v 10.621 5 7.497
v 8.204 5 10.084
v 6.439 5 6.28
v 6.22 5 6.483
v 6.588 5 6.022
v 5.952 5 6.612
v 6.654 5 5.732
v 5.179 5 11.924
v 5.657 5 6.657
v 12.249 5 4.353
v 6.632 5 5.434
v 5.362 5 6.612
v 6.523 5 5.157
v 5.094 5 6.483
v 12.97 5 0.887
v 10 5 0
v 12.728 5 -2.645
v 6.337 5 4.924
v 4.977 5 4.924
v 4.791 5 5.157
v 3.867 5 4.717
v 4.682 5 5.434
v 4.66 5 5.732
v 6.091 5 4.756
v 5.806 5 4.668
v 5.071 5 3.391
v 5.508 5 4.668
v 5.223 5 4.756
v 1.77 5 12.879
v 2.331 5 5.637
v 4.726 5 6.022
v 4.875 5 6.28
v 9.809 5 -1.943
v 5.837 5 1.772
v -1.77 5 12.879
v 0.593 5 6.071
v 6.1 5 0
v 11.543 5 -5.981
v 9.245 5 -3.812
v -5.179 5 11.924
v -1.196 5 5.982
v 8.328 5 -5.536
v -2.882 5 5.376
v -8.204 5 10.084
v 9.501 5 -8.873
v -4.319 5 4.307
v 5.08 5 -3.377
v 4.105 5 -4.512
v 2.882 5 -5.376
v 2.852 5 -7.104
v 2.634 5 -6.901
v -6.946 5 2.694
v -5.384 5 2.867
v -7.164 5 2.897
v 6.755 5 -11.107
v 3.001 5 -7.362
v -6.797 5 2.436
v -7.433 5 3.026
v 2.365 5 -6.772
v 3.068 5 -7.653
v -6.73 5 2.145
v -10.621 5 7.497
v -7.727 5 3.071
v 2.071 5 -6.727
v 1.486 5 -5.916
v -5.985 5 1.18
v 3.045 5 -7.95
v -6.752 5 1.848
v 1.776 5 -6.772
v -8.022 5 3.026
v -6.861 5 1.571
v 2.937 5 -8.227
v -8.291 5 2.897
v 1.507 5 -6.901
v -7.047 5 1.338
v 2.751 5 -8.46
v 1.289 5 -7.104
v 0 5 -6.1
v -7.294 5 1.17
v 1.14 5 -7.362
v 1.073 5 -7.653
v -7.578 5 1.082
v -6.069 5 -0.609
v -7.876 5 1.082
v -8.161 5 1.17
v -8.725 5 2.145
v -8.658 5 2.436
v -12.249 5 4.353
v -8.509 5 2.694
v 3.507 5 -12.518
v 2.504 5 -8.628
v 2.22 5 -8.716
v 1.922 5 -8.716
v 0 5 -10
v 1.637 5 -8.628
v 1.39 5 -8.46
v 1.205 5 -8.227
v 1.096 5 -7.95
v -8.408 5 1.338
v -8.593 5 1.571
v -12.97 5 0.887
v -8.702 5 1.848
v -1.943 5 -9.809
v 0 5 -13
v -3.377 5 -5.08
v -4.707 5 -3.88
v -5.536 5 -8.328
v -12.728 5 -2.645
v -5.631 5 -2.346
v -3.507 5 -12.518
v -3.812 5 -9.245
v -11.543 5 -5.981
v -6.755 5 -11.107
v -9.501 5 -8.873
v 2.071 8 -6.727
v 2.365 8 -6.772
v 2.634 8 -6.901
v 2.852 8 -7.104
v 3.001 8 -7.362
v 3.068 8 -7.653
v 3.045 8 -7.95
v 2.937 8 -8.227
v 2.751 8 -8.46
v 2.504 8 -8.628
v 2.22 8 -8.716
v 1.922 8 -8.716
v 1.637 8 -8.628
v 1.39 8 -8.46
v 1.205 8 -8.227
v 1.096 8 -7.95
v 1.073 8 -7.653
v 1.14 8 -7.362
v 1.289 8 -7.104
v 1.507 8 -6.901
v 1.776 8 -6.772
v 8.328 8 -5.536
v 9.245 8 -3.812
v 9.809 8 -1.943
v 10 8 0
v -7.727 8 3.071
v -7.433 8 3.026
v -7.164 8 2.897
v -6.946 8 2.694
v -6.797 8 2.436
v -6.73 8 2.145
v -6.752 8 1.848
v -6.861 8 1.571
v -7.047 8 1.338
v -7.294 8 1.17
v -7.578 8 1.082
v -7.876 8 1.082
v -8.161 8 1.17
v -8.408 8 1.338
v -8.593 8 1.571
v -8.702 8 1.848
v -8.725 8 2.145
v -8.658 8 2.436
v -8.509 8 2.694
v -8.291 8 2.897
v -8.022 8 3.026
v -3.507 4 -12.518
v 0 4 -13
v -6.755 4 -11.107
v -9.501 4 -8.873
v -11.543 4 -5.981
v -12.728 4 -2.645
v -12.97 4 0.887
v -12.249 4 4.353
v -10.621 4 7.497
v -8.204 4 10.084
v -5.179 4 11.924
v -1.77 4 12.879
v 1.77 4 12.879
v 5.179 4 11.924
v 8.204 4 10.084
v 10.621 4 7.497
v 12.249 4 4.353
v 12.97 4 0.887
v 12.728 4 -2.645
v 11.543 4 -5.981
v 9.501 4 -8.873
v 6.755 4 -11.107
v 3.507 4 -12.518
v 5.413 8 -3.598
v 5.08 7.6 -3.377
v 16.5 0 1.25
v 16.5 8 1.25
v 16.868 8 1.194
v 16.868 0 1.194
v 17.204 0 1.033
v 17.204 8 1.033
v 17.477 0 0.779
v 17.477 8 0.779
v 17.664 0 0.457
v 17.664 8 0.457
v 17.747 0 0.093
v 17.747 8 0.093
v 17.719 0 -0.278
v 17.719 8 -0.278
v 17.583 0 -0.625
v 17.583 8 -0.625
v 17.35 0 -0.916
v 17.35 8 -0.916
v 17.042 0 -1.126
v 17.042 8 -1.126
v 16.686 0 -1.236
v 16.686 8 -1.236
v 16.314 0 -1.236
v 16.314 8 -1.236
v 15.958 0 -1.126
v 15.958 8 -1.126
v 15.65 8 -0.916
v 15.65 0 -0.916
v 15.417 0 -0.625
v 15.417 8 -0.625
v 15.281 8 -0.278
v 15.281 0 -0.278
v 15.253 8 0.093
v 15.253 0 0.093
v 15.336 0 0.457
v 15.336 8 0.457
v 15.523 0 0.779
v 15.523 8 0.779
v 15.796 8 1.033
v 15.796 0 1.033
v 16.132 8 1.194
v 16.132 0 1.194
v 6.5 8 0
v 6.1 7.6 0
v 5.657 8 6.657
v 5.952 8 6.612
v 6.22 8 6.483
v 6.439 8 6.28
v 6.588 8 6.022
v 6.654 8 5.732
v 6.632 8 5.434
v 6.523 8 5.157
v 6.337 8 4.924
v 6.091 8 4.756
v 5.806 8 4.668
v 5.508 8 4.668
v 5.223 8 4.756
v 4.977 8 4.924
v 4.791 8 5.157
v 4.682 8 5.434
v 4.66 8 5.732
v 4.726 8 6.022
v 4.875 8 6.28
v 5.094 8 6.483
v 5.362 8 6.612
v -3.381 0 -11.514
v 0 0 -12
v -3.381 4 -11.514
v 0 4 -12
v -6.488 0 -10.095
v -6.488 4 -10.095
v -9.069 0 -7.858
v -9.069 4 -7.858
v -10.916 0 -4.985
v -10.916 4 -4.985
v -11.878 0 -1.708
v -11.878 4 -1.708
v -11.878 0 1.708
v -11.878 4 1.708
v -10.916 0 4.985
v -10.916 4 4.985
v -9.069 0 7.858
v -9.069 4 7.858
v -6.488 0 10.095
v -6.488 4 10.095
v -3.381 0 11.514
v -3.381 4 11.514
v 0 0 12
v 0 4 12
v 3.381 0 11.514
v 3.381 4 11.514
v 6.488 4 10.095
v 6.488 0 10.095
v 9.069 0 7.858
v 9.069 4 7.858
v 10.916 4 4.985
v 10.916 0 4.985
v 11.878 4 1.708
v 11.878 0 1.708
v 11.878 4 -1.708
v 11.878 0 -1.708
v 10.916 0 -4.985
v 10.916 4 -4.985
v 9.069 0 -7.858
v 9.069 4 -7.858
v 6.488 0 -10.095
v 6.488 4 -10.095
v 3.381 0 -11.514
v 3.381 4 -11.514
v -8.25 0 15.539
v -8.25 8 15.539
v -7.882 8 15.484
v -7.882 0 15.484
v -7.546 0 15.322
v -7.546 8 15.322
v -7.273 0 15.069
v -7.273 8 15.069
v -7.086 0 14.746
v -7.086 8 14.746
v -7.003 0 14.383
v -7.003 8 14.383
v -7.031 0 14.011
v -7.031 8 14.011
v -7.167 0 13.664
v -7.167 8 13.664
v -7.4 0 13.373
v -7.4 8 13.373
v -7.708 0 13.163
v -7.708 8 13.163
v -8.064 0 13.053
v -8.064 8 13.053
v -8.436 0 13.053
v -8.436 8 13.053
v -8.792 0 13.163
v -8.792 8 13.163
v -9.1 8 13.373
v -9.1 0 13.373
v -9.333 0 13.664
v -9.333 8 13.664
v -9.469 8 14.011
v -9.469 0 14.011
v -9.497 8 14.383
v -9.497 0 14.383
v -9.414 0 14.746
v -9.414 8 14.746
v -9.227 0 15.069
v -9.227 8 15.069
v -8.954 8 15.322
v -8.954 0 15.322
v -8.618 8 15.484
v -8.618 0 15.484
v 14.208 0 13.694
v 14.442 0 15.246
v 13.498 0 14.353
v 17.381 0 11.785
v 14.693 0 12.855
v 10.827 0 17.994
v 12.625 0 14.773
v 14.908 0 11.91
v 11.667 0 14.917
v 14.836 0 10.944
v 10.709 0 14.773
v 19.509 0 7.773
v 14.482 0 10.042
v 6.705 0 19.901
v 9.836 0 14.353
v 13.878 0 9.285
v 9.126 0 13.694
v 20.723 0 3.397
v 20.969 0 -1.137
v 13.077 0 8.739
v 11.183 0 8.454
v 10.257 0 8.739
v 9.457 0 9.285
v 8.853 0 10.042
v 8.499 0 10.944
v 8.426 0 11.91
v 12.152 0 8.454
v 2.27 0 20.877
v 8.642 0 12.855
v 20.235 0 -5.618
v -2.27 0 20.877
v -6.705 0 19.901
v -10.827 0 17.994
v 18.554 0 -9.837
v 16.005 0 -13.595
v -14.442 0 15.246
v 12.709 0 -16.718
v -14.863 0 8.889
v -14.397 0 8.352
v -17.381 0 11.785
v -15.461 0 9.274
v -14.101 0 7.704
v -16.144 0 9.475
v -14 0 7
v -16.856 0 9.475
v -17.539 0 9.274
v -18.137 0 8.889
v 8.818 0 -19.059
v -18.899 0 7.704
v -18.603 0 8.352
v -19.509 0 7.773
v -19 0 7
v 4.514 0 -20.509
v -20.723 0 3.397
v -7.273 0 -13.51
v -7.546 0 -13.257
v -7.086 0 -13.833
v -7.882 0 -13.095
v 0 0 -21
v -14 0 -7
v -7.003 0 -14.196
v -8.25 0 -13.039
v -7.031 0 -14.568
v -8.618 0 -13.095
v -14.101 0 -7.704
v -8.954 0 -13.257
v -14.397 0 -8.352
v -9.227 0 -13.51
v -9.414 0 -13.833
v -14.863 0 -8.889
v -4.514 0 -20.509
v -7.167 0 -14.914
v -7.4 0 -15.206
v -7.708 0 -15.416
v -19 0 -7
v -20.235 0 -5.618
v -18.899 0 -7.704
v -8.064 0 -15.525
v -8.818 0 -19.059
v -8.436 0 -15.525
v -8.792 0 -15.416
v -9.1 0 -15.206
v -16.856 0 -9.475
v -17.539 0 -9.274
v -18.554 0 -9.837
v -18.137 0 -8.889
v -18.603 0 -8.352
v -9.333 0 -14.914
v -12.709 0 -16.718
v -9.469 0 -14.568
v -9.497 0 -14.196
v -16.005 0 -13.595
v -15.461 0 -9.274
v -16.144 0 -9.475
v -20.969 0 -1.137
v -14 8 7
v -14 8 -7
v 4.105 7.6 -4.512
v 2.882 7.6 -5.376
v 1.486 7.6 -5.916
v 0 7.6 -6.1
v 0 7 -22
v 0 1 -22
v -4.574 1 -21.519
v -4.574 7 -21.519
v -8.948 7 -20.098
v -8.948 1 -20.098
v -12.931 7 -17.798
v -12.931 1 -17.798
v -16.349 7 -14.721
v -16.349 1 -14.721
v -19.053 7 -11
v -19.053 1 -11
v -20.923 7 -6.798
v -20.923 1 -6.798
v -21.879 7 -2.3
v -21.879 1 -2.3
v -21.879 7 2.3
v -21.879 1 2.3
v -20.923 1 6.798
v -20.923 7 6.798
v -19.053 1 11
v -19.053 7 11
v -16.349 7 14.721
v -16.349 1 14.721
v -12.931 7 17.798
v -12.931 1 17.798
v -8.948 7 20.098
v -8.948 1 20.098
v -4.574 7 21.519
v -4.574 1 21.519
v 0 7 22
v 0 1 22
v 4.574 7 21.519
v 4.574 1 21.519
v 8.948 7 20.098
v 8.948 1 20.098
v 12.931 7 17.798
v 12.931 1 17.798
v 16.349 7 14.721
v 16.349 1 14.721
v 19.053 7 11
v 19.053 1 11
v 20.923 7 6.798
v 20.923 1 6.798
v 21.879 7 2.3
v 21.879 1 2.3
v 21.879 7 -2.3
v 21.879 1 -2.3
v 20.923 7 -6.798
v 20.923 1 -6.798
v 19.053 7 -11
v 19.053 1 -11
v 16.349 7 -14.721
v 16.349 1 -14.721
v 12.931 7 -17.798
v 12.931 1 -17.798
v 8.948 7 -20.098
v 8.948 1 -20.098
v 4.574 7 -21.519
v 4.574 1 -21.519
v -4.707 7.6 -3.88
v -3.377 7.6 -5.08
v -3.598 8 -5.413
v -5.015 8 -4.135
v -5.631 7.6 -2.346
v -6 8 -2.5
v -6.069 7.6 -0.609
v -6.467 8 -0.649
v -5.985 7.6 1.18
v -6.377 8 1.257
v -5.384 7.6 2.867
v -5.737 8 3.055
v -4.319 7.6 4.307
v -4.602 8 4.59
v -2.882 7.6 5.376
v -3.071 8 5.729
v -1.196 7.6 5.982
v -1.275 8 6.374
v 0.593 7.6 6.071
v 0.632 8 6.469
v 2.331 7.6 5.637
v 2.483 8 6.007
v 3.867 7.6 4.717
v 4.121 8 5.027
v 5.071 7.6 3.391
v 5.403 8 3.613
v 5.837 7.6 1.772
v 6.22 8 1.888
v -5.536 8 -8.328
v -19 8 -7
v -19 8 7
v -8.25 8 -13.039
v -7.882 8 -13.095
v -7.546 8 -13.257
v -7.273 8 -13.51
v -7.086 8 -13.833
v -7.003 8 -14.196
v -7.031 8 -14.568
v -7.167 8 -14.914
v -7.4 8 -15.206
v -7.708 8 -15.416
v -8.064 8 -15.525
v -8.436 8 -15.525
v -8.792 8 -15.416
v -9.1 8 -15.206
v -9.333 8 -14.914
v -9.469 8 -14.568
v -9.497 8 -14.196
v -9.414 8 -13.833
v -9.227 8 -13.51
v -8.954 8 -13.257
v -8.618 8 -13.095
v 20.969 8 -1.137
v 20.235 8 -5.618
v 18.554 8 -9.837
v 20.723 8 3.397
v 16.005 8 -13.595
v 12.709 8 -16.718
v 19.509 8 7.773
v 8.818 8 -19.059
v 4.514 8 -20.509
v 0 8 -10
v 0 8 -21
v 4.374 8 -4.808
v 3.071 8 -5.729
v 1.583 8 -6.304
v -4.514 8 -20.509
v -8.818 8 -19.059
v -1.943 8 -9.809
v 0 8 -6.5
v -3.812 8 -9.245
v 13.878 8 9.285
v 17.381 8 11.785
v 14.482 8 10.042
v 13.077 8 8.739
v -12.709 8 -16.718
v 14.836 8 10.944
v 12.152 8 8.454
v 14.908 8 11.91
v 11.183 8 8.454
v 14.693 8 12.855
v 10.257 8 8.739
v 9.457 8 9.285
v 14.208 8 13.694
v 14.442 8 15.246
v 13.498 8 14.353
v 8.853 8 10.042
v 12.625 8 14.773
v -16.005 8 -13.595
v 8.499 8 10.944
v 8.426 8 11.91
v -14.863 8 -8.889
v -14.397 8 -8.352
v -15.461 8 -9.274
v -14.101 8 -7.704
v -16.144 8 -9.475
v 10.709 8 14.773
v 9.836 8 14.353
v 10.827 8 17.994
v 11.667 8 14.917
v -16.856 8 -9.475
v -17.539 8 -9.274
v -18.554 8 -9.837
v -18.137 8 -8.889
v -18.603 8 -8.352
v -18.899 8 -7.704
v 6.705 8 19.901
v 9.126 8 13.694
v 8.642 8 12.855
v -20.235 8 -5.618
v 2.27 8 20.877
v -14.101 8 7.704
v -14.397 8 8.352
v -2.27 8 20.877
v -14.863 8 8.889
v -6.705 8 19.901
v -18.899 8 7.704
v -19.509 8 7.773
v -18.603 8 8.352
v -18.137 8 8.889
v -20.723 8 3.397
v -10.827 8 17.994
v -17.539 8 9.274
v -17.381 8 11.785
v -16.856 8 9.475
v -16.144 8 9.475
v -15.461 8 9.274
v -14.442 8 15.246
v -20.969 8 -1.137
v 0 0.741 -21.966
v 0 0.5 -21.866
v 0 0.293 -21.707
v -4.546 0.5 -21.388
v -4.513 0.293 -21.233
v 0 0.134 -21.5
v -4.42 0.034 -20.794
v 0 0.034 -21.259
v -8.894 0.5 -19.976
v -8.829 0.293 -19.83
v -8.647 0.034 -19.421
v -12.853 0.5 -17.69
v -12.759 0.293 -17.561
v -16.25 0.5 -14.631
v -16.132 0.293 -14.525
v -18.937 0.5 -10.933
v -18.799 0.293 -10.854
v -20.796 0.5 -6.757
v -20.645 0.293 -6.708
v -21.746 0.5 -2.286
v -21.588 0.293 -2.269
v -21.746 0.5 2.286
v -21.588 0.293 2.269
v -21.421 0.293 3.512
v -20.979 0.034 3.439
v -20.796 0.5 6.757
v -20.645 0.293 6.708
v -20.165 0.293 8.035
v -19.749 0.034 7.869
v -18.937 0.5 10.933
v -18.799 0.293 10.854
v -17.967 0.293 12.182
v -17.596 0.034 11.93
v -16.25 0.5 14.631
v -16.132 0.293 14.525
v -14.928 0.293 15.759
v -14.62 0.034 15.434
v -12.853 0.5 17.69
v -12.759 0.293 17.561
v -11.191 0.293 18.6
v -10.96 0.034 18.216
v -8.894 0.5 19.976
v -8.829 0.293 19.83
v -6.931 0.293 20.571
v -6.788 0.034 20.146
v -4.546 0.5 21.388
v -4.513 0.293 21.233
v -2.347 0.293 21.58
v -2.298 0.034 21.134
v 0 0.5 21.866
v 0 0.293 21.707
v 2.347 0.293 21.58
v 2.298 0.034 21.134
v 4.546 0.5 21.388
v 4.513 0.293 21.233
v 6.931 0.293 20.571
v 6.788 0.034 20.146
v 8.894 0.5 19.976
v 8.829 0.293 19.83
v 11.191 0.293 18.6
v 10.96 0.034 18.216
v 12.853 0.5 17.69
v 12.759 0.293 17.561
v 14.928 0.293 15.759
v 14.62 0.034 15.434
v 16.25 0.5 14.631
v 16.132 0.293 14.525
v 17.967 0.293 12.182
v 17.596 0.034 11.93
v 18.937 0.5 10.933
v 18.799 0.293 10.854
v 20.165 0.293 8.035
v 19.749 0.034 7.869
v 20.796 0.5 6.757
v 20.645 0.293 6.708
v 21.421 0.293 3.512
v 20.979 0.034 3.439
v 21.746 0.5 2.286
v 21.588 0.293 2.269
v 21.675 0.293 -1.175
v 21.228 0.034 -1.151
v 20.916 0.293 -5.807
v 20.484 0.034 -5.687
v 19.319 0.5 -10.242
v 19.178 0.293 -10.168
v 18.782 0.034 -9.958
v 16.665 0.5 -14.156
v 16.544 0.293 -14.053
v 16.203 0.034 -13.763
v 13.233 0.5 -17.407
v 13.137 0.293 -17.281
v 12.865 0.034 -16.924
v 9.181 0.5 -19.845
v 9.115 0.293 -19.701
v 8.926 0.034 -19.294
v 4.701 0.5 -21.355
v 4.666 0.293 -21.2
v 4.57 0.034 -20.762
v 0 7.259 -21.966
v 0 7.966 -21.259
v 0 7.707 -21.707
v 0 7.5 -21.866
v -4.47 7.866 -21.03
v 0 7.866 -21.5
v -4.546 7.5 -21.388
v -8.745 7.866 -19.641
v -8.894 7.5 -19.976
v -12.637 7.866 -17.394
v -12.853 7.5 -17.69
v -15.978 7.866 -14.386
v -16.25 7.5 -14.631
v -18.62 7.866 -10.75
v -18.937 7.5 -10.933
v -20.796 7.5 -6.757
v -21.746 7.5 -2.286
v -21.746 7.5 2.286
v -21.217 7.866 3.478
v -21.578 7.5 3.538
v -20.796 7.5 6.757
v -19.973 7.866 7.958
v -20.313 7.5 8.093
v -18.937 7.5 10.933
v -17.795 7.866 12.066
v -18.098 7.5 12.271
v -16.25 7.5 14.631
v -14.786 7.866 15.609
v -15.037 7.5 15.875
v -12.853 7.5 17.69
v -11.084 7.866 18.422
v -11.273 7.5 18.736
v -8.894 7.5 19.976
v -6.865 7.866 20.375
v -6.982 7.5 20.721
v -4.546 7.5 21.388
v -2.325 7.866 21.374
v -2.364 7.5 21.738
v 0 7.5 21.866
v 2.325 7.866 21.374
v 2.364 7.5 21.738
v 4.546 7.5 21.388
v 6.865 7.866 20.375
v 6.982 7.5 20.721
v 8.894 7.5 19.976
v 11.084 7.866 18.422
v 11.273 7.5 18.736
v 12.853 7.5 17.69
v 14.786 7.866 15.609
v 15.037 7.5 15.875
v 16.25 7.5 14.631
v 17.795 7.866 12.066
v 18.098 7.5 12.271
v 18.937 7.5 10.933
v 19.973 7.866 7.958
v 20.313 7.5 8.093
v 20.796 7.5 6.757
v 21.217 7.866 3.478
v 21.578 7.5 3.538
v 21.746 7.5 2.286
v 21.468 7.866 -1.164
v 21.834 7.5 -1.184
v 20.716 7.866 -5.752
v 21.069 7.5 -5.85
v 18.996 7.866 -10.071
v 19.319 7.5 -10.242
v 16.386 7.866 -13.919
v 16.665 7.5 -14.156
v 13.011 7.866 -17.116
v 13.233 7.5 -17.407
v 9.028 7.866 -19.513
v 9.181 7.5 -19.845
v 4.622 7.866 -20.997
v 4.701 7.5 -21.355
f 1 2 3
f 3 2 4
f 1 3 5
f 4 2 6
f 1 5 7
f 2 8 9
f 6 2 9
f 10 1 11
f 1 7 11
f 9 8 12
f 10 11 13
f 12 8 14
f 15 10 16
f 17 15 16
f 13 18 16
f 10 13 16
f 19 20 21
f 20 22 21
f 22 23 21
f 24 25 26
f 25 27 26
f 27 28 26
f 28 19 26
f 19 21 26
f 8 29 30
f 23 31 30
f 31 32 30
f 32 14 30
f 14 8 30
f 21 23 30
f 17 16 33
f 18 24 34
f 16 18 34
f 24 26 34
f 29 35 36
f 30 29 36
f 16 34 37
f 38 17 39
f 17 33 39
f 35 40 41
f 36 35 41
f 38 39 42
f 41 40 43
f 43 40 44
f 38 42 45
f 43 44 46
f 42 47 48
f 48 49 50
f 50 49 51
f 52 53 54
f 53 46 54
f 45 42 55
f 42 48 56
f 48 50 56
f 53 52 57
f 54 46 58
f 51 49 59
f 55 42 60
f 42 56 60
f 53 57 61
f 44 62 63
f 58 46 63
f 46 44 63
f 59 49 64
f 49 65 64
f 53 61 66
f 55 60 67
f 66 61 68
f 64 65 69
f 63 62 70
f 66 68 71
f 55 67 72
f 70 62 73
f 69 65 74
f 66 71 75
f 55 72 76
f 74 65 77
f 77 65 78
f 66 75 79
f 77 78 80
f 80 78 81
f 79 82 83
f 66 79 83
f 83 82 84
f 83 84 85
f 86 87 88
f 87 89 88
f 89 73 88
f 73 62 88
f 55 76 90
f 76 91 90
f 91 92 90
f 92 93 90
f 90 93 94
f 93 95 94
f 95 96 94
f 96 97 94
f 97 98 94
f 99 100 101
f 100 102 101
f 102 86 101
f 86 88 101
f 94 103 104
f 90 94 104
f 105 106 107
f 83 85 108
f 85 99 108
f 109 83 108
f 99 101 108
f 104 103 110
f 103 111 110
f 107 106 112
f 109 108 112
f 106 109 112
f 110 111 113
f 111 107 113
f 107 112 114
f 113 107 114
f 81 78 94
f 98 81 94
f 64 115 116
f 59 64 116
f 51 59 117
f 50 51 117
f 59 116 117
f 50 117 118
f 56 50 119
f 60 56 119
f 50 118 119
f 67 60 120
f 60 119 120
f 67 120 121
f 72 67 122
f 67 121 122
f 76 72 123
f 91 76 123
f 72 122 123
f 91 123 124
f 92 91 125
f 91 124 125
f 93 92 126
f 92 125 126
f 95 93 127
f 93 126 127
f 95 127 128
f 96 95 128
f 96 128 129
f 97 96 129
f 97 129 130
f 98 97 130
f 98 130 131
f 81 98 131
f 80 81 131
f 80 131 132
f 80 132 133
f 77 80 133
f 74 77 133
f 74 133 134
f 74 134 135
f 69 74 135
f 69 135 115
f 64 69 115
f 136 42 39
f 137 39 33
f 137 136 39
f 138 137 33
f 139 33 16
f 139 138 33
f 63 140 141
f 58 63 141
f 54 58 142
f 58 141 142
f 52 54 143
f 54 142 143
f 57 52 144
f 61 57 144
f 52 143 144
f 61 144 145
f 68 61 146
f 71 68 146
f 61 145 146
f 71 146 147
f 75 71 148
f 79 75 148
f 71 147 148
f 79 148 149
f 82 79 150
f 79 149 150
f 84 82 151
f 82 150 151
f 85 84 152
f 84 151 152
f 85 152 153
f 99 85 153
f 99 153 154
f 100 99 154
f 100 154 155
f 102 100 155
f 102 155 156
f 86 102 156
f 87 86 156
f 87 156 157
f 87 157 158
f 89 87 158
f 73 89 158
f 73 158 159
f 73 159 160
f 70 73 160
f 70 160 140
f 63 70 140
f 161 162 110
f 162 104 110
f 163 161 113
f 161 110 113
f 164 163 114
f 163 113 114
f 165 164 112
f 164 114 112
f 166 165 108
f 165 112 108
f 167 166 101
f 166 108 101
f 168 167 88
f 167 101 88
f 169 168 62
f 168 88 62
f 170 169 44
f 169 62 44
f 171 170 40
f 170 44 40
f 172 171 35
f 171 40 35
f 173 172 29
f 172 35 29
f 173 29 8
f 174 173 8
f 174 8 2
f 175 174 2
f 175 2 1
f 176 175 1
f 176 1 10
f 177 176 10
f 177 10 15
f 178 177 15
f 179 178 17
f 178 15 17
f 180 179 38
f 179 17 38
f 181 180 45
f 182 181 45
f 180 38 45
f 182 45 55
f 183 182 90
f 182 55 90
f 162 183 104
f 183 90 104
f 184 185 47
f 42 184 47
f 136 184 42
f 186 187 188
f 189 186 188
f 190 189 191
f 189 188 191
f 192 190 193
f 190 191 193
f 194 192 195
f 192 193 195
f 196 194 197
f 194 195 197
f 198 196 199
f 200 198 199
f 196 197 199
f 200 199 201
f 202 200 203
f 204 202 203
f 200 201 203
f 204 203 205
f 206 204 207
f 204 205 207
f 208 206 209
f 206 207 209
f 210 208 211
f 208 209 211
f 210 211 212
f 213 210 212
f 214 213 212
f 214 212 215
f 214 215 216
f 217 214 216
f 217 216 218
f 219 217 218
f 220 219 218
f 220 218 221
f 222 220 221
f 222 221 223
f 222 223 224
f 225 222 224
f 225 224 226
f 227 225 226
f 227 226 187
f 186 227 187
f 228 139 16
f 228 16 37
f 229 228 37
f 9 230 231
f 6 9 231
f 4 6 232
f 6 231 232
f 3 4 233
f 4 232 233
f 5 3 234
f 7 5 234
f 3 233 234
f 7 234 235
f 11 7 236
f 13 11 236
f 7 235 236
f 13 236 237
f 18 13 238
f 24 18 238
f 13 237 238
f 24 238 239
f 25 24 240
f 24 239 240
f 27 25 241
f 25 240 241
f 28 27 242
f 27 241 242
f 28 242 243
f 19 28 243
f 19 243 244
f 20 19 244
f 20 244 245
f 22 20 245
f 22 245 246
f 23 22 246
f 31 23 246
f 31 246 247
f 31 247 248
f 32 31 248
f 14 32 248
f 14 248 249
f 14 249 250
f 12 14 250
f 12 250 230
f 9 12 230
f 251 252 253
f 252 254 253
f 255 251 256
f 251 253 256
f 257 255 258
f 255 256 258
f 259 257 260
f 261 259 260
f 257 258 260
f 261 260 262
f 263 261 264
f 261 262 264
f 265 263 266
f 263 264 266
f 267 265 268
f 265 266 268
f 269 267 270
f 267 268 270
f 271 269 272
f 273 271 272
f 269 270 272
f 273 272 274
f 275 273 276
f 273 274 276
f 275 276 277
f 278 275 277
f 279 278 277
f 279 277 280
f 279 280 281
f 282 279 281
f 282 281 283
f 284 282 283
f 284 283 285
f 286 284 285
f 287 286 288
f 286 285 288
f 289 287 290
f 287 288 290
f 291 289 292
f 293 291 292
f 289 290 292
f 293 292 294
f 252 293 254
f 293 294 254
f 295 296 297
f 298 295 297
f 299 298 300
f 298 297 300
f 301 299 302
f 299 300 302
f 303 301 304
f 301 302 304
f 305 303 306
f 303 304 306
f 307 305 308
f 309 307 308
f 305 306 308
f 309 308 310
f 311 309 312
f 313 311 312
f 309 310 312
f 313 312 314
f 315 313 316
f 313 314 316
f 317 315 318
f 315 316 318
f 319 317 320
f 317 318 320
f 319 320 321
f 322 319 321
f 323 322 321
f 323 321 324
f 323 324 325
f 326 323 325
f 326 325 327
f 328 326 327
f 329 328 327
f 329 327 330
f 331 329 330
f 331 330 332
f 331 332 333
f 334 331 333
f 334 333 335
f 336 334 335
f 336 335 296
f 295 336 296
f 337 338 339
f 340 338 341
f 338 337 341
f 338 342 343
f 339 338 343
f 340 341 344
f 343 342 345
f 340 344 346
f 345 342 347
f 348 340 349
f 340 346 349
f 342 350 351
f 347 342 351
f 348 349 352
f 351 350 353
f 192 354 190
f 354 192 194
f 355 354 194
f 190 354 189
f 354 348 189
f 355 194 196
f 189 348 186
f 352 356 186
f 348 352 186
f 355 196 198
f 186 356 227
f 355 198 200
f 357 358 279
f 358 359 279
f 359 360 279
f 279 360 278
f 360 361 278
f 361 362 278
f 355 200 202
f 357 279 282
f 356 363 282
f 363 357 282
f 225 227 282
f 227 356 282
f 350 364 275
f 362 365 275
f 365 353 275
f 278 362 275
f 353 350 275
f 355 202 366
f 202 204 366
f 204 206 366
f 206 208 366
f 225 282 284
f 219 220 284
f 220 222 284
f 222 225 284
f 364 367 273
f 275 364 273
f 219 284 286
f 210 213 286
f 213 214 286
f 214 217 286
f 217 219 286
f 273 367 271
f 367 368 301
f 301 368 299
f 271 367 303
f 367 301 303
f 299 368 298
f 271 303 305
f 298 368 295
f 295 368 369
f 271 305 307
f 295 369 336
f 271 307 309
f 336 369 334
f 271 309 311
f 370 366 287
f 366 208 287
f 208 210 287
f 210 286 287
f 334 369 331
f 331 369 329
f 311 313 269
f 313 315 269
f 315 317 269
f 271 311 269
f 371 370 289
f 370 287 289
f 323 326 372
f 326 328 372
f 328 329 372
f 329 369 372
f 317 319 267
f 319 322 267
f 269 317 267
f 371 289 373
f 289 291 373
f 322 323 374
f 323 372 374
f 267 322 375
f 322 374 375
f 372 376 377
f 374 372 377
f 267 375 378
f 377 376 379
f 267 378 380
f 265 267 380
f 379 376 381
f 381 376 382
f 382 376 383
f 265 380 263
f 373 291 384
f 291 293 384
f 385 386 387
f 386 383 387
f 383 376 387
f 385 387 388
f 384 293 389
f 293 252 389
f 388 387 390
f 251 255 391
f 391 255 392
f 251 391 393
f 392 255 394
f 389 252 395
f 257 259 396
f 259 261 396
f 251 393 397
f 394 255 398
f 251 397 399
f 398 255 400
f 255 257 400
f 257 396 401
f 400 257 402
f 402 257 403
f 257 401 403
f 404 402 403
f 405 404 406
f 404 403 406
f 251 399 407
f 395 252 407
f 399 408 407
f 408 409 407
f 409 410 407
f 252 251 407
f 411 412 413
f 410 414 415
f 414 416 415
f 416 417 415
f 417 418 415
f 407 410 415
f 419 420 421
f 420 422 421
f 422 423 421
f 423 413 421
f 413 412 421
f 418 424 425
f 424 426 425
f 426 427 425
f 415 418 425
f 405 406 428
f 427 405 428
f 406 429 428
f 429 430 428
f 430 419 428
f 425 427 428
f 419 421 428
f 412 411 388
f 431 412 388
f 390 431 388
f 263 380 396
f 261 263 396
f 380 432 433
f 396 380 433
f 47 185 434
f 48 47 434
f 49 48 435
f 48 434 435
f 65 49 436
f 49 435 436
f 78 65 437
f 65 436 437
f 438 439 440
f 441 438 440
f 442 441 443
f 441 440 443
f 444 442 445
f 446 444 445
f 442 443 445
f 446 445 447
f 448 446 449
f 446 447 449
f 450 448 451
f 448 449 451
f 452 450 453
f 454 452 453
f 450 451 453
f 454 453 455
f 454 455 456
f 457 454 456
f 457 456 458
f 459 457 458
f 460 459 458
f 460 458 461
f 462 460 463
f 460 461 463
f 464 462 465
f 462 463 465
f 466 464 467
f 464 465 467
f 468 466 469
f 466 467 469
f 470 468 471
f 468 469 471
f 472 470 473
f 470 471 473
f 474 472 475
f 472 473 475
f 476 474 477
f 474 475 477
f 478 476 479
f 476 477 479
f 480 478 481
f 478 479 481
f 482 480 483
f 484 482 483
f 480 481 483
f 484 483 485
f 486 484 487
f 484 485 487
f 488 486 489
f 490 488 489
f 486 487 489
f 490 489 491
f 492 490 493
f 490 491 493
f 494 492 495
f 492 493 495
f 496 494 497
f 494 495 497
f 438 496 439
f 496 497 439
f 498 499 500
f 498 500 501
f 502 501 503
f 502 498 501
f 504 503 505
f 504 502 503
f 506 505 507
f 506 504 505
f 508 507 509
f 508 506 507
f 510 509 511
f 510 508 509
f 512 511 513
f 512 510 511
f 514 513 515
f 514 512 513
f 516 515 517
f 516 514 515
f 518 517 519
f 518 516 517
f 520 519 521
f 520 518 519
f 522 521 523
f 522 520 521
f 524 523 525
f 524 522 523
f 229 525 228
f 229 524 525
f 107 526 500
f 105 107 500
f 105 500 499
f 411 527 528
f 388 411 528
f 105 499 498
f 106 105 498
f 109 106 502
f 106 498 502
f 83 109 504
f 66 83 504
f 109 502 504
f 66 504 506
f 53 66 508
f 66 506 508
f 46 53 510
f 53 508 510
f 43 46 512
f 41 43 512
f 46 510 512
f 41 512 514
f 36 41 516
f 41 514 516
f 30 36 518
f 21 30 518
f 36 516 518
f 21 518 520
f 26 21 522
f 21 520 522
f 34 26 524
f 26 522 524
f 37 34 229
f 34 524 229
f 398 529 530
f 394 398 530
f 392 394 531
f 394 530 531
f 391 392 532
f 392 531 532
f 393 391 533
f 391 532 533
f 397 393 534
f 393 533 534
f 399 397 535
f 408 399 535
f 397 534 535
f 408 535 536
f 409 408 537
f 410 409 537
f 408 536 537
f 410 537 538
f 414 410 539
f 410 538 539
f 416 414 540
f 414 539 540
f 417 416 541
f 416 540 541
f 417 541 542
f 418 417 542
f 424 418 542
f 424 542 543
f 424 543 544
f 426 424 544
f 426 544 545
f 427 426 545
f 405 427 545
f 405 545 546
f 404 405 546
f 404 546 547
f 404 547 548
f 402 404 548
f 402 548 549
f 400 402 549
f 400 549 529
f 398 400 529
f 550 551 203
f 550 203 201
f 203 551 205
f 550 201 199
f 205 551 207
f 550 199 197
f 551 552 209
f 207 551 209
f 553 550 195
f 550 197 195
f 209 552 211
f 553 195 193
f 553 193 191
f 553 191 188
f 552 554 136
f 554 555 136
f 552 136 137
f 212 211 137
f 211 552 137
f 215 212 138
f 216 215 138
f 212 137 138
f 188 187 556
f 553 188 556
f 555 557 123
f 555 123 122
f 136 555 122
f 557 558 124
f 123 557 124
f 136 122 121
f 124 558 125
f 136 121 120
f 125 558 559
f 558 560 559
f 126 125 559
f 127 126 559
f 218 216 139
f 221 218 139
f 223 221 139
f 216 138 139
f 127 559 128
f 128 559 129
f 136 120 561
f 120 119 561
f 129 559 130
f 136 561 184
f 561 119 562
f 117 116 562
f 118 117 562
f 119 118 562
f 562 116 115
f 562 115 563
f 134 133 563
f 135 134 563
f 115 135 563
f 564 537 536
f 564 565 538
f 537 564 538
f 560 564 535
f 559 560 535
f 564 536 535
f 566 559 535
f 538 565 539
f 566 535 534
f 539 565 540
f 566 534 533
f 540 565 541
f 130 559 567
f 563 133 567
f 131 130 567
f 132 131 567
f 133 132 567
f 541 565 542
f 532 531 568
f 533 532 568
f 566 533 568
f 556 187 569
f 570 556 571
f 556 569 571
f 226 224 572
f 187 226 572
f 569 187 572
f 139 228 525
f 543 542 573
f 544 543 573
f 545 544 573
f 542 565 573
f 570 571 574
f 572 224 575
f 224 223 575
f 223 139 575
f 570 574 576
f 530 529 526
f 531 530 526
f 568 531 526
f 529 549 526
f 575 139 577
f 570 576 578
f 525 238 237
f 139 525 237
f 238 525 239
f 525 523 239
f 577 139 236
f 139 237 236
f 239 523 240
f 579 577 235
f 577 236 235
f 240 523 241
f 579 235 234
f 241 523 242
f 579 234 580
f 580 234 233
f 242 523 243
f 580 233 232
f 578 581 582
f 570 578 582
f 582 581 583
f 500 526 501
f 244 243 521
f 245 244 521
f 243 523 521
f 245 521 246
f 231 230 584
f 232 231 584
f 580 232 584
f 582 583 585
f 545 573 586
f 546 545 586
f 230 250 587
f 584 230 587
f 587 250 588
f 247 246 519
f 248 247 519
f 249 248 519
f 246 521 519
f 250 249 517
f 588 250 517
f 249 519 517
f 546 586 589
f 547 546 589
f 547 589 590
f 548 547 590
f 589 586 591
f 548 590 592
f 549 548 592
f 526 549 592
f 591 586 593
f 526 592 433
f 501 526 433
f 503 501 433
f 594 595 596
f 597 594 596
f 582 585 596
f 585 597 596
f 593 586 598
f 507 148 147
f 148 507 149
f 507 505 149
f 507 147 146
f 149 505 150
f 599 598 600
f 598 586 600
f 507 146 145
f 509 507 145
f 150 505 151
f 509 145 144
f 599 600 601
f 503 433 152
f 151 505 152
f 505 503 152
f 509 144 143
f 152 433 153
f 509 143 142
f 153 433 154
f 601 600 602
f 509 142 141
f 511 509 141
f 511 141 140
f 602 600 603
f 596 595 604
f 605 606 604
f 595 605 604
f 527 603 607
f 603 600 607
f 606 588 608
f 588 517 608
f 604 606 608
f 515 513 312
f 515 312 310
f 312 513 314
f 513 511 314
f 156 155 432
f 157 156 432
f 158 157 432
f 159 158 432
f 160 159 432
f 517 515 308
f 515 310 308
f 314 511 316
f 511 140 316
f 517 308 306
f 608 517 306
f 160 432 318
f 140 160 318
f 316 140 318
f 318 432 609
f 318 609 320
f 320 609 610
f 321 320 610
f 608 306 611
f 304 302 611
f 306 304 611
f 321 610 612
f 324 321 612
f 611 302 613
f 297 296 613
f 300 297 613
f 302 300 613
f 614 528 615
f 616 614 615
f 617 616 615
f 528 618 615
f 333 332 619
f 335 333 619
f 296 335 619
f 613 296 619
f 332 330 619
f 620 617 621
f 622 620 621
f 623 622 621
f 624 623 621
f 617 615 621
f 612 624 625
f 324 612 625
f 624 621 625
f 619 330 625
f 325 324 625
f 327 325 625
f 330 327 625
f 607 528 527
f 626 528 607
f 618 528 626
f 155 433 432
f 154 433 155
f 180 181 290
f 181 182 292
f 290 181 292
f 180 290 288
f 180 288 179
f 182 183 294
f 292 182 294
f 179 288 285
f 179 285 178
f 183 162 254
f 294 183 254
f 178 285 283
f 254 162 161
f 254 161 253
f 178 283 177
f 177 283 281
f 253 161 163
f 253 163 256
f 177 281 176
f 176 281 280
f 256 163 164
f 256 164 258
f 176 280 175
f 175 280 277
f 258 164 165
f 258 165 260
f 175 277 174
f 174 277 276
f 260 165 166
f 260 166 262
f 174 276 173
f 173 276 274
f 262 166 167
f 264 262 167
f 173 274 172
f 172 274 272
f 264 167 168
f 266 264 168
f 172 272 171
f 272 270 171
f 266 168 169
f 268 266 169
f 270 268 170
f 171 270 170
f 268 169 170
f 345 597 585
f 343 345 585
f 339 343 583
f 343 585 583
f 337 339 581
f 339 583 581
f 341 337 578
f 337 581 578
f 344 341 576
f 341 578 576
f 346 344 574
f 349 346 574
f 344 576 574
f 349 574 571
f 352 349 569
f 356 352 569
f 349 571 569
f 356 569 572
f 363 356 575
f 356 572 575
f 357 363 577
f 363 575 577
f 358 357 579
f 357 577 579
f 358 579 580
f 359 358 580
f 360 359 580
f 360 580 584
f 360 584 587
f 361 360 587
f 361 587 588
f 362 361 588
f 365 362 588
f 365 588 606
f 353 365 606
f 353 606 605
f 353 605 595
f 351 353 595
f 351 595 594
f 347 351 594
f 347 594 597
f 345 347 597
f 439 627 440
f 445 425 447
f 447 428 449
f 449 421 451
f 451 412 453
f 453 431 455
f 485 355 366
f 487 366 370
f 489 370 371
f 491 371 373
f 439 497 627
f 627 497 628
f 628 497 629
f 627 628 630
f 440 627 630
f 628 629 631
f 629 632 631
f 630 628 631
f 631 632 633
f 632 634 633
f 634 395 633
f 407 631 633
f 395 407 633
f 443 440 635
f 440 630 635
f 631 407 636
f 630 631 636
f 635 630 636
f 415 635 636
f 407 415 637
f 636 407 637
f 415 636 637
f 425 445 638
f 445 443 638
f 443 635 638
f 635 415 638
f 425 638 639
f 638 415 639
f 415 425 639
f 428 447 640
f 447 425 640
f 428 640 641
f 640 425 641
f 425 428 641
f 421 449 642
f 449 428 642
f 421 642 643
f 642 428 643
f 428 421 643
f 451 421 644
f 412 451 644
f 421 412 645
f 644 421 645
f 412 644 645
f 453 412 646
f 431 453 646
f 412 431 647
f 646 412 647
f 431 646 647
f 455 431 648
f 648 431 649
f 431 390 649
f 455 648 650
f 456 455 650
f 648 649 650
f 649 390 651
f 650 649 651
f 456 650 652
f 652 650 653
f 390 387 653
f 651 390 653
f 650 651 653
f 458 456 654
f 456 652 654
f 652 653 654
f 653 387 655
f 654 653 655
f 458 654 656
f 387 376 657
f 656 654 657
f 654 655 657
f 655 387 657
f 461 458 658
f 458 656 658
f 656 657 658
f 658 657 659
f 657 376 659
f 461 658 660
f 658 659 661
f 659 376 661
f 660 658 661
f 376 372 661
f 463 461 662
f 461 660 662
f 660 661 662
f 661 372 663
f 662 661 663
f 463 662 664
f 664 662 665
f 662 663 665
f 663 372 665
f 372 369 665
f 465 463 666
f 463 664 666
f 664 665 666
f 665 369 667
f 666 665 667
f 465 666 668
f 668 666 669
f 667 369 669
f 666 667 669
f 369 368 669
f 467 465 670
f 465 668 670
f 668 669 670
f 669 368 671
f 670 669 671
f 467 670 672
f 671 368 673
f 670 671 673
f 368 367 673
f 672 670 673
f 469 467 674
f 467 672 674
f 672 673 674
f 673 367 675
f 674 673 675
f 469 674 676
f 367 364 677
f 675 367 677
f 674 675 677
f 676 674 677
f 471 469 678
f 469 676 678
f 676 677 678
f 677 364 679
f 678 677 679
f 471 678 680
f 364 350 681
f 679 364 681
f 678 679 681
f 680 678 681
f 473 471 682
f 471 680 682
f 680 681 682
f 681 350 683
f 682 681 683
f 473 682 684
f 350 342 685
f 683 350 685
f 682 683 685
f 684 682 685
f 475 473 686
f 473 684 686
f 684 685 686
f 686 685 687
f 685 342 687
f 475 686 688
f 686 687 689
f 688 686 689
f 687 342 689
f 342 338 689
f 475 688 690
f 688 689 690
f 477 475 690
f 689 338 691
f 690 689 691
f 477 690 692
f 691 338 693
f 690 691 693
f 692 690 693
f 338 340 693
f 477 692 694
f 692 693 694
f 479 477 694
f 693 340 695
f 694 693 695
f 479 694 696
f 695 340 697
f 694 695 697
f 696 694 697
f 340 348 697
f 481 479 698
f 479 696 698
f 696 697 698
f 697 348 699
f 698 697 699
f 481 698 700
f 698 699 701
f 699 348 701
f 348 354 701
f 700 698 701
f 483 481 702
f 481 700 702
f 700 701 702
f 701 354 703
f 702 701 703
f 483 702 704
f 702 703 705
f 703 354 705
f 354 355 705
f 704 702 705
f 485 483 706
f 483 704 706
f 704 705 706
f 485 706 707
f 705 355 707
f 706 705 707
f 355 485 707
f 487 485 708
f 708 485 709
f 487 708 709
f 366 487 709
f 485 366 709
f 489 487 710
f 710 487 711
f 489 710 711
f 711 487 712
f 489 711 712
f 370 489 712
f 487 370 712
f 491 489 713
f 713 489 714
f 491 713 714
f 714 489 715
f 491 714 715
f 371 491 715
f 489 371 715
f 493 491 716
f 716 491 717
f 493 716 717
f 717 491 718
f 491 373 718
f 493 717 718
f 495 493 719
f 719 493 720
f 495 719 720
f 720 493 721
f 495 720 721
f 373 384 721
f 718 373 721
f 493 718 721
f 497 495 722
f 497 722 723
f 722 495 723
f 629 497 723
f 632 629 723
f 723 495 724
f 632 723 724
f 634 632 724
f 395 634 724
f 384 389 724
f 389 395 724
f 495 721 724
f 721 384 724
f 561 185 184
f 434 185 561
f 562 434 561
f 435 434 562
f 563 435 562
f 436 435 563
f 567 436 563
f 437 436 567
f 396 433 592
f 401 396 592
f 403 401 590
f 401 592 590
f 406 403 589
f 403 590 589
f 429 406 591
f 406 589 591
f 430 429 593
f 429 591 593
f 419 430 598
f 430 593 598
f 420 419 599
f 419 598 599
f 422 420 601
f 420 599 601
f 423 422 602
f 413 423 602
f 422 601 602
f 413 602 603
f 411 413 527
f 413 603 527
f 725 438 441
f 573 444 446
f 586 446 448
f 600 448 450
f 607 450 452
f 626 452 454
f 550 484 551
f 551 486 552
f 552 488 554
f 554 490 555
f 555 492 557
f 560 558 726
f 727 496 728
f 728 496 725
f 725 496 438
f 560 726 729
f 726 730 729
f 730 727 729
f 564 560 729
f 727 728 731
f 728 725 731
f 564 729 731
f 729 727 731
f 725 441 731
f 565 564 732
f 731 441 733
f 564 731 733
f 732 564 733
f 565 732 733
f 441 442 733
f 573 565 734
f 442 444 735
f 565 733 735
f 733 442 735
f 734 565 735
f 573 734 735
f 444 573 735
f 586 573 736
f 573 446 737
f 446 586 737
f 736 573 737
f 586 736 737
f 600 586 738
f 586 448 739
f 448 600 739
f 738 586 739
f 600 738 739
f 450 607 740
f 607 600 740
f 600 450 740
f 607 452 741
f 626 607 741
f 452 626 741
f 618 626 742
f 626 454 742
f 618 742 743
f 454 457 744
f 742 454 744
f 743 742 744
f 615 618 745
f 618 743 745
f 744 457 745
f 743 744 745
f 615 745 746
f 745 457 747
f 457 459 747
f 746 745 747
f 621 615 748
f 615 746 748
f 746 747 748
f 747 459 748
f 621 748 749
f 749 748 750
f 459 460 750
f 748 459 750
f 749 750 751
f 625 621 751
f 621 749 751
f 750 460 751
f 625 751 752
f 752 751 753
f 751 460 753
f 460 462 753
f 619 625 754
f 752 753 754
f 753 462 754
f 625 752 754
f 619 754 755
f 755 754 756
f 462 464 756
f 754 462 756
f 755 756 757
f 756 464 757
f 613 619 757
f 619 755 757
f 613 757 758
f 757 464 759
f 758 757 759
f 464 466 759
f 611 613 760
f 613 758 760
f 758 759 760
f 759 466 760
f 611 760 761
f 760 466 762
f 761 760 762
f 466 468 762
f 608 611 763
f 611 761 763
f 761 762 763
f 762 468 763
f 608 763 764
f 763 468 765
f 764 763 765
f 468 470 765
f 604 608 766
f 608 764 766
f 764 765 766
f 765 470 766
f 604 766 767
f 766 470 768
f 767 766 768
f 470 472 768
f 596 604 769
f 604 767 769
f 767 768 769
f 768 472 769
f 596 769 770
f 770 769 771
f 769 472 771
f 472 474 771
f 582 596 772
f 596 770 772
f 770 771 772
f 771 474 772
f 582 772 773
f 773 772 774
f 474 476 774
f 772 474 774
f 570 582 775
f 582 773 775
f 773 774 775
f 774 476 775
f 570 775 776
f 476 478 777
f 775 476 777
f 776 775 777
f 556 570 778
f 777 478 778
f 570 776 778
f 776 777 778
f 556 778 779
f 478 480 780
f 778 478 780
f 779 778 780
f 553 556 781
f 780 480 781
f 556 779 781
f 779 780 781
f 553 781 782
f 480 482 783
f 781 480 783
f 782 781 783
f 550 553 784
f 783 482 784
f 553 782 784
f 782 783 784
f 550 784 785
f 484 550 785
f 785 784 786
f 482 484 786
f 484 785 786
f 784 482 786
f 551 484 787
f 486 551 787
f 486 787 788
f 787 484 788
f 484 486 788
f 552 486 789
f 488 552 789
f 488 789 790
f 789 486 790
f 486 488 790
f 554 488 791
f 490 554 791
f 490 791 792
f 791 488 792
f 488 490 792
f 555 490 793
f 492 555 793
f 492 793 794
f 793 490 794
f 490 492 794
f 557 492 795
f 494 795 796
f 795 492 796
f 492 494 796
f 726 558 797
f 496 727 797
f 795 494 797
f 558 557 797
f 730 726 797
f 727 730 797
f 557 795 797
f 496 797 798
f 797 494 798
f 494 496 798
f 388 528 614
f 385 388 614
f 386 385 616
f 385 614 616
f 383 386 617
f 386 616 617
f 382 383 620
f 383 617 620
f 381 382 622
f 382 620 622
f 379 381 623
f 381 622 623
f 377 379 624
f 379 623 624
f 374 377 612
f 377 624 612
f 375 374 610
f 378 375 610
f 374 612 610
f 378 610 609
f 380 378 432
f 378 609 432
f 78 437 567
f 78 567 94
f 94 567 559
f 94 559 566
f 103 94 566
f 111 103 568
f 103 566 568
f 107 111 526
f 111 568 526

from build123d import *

# Parameters (mm, degrees)
FILLET2_R          = 1
CHAMFER2_SIZE      = 0.4
SKETCH3_R          = 1
SKETCH3_R_2        = 1.25
SKETCH3_R_3        = 3.25
CUT_EXTRUDE1_DEPTH = 10


with BuildPart() as part:
    # Sketch1 → Revolve1 (revolve)
    with BuildSketch(Plane.XY, mode=Mode.PRIVATE) as revolve1_sk:
        Polygon((12, 0), (12, 4), (13, 4), (13, 5), (6.1, 5), (6.1, 8), (22, 8), (22, 0), align=None)
    revolve(revolve1_sk.sketch.rotate(Axis((0, 0, 0), (0, 1, 0)), 90), axis=Axis((0, 0, 0), (0, 1, 0)))

    # Fillet2
    fillet2_edges = [part.edges().sort_by_distance(p)[0] for p in [
        (0, 8, 22),
        (0, 0, 22),
    ]]
    fillet(fillet2_edges, radius=FILLET2_R)

    # Chamfer2
    chamfer2_edges = [part.edges().sort_by_distance(p)[0] for p in [
        (0, 8, 6.1),
    ]]
    chamfer(chamfer2_edges, length=CHAMFER2_SIZE)

    # Sketch3 → Cut-Extrude1 (cut)
    with BuildSketch(Plane(origin=(0, 8, 0), x_dir=(1, 0, 0), z_dir=(0, 1, 0))):
        with Locations(Location((2.070552361, 7.72740661, 0), (0, 0, 270))):
            Circle(SKETCH3_R)
        with Locations(Location((5.656854249, -5.656854249, 0), (0, 0, 270))):
            Circle(SKETCH3_R)
        with Locations(Location((-7.72740661, -2.070552361, 0), (0, 0, 270))):
            Circle(SKETCH3_R)
        with Locations(Location((16.5, 0, 0), (0, 0, 270))):
            Circle(SKETCH3_R_2)
        with Locations(Location((-8.25, -14.289419162, 0), (0, 0, 270))):
            Circle(SKETCH3_R_2)
        with Locations(Location((-8.25, 14.289419162, 0), (0, 0, 270))):
            Circle(SKETCH3_R_2)
        with Locations(Location((11.66726189, -11.66726189, 0), (0, 0, 270))):
            Circle(SKETCH3_R_3)
        with BuildLine():
            Line((0, 0), (8.327920422, 5.535859594))
            ThreePointArc((8.327920422, 5.535859594), (9.572857573, 2.891435264), (10, 0))
            Line((10, 0), (0, 0))
        make_face()
        with BuildLine():
            Line((-19, 7), (-19, -7))
            ThreePointArc((-19, -7), (-16.5, -9.5), (-14, -7))
            Line((-14, -7), (-14, 7))
            ThreePointArc((-14, 7), (-16.5, 9.5), (-19, 7))
        make_face()
        with BuildLine():
            Line((-5.535859594, 8.327920422), (-3.064574144, 4.610219816))
            ThreePointArc((-3.064574144, 4.610219816), (-1.600657965, 5.299399543), (0, 5.535859594))
            Line((0, 5.535859594), (0, 10))
            ThreePointArc((0, 10), (-2.891435264, 9.572857573), (-5.535859594, 8.327920422))
        make_face()
    extrude(amount=-CUT_EXTRUDE1_DEPTH, mode=Mode.SUBTRACT)


solid = part.part
